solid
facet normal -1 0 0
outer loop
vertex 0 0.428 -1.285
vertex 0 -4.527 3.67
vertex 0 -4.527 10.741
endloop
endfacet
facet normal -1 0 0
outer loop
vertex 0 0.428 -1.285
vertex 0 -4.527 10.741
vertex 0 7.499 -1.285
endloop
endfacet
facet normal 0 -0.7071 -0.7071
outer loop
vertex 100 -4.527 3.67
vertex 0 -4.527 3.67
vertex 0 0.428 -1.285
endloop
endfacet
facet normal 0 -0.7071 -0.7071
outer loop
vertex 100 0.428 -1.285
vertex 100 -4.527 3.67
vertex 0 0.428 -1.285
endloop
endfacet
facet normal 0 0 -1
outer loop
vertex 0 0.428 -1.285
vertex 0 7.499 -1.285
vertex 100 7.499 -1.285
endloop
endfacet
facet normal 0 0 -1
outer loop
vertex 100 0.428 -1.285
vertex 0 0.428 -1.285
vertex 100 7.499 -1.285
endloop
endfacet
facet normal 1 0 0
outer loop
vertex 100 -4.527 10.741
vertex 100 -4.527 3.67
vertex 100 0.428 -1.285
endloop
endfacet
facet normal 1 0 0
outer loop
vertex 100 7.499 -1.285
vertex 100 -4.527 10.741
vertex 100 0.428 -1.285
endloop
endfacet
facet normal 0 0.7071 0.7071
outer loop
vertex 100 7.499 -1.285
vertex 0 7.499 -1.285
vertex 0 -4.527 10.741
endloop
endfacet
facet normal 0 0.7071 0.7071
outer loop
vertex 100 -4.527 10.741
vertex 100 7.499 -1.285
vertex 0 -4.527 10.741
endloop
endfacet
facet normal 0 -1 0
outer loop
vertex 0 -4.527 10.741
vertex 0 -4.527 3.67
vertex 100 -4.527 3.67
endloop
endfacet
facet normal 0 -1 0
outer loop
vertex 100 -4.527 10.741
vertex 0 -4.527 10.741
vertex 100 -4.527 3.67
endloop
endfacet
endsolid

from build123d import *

# Parameters (mm, degrees)
F1_DEPTH = 100
F2_SIZE  = 4.99999


# Not quite as in the source:
# - a fillet or chamfer is up to 0.001 mm smaller than in the source, because OpenCascade refuses the exact size


with BuildPart() as f1:
    # F0 (on Right) → F1 (new body)
    with BuildSketch(Plane.YZ):
        Polygon((7.4991378996, -1.2852627068), (-4.5274403009, 10.7413154936), (-8.0629742068, 7.2057815877), (3.9636039936, -4.8207966127), align=None)
    extrude(amount=F1_DEPTH)

    # F2 (size 5 in the source; OpenCascade refuses exactly that, so slightly less here)
    f2_edges = [f1.edges().sort_by_distance(p)[0] for p in [
        (50, -8.062974, 7.205782),
        (50, 3.963604, -4.820797),
    ]]
    chamfer(f2_edges, length=F2_SIZE)


solid = f1.part
